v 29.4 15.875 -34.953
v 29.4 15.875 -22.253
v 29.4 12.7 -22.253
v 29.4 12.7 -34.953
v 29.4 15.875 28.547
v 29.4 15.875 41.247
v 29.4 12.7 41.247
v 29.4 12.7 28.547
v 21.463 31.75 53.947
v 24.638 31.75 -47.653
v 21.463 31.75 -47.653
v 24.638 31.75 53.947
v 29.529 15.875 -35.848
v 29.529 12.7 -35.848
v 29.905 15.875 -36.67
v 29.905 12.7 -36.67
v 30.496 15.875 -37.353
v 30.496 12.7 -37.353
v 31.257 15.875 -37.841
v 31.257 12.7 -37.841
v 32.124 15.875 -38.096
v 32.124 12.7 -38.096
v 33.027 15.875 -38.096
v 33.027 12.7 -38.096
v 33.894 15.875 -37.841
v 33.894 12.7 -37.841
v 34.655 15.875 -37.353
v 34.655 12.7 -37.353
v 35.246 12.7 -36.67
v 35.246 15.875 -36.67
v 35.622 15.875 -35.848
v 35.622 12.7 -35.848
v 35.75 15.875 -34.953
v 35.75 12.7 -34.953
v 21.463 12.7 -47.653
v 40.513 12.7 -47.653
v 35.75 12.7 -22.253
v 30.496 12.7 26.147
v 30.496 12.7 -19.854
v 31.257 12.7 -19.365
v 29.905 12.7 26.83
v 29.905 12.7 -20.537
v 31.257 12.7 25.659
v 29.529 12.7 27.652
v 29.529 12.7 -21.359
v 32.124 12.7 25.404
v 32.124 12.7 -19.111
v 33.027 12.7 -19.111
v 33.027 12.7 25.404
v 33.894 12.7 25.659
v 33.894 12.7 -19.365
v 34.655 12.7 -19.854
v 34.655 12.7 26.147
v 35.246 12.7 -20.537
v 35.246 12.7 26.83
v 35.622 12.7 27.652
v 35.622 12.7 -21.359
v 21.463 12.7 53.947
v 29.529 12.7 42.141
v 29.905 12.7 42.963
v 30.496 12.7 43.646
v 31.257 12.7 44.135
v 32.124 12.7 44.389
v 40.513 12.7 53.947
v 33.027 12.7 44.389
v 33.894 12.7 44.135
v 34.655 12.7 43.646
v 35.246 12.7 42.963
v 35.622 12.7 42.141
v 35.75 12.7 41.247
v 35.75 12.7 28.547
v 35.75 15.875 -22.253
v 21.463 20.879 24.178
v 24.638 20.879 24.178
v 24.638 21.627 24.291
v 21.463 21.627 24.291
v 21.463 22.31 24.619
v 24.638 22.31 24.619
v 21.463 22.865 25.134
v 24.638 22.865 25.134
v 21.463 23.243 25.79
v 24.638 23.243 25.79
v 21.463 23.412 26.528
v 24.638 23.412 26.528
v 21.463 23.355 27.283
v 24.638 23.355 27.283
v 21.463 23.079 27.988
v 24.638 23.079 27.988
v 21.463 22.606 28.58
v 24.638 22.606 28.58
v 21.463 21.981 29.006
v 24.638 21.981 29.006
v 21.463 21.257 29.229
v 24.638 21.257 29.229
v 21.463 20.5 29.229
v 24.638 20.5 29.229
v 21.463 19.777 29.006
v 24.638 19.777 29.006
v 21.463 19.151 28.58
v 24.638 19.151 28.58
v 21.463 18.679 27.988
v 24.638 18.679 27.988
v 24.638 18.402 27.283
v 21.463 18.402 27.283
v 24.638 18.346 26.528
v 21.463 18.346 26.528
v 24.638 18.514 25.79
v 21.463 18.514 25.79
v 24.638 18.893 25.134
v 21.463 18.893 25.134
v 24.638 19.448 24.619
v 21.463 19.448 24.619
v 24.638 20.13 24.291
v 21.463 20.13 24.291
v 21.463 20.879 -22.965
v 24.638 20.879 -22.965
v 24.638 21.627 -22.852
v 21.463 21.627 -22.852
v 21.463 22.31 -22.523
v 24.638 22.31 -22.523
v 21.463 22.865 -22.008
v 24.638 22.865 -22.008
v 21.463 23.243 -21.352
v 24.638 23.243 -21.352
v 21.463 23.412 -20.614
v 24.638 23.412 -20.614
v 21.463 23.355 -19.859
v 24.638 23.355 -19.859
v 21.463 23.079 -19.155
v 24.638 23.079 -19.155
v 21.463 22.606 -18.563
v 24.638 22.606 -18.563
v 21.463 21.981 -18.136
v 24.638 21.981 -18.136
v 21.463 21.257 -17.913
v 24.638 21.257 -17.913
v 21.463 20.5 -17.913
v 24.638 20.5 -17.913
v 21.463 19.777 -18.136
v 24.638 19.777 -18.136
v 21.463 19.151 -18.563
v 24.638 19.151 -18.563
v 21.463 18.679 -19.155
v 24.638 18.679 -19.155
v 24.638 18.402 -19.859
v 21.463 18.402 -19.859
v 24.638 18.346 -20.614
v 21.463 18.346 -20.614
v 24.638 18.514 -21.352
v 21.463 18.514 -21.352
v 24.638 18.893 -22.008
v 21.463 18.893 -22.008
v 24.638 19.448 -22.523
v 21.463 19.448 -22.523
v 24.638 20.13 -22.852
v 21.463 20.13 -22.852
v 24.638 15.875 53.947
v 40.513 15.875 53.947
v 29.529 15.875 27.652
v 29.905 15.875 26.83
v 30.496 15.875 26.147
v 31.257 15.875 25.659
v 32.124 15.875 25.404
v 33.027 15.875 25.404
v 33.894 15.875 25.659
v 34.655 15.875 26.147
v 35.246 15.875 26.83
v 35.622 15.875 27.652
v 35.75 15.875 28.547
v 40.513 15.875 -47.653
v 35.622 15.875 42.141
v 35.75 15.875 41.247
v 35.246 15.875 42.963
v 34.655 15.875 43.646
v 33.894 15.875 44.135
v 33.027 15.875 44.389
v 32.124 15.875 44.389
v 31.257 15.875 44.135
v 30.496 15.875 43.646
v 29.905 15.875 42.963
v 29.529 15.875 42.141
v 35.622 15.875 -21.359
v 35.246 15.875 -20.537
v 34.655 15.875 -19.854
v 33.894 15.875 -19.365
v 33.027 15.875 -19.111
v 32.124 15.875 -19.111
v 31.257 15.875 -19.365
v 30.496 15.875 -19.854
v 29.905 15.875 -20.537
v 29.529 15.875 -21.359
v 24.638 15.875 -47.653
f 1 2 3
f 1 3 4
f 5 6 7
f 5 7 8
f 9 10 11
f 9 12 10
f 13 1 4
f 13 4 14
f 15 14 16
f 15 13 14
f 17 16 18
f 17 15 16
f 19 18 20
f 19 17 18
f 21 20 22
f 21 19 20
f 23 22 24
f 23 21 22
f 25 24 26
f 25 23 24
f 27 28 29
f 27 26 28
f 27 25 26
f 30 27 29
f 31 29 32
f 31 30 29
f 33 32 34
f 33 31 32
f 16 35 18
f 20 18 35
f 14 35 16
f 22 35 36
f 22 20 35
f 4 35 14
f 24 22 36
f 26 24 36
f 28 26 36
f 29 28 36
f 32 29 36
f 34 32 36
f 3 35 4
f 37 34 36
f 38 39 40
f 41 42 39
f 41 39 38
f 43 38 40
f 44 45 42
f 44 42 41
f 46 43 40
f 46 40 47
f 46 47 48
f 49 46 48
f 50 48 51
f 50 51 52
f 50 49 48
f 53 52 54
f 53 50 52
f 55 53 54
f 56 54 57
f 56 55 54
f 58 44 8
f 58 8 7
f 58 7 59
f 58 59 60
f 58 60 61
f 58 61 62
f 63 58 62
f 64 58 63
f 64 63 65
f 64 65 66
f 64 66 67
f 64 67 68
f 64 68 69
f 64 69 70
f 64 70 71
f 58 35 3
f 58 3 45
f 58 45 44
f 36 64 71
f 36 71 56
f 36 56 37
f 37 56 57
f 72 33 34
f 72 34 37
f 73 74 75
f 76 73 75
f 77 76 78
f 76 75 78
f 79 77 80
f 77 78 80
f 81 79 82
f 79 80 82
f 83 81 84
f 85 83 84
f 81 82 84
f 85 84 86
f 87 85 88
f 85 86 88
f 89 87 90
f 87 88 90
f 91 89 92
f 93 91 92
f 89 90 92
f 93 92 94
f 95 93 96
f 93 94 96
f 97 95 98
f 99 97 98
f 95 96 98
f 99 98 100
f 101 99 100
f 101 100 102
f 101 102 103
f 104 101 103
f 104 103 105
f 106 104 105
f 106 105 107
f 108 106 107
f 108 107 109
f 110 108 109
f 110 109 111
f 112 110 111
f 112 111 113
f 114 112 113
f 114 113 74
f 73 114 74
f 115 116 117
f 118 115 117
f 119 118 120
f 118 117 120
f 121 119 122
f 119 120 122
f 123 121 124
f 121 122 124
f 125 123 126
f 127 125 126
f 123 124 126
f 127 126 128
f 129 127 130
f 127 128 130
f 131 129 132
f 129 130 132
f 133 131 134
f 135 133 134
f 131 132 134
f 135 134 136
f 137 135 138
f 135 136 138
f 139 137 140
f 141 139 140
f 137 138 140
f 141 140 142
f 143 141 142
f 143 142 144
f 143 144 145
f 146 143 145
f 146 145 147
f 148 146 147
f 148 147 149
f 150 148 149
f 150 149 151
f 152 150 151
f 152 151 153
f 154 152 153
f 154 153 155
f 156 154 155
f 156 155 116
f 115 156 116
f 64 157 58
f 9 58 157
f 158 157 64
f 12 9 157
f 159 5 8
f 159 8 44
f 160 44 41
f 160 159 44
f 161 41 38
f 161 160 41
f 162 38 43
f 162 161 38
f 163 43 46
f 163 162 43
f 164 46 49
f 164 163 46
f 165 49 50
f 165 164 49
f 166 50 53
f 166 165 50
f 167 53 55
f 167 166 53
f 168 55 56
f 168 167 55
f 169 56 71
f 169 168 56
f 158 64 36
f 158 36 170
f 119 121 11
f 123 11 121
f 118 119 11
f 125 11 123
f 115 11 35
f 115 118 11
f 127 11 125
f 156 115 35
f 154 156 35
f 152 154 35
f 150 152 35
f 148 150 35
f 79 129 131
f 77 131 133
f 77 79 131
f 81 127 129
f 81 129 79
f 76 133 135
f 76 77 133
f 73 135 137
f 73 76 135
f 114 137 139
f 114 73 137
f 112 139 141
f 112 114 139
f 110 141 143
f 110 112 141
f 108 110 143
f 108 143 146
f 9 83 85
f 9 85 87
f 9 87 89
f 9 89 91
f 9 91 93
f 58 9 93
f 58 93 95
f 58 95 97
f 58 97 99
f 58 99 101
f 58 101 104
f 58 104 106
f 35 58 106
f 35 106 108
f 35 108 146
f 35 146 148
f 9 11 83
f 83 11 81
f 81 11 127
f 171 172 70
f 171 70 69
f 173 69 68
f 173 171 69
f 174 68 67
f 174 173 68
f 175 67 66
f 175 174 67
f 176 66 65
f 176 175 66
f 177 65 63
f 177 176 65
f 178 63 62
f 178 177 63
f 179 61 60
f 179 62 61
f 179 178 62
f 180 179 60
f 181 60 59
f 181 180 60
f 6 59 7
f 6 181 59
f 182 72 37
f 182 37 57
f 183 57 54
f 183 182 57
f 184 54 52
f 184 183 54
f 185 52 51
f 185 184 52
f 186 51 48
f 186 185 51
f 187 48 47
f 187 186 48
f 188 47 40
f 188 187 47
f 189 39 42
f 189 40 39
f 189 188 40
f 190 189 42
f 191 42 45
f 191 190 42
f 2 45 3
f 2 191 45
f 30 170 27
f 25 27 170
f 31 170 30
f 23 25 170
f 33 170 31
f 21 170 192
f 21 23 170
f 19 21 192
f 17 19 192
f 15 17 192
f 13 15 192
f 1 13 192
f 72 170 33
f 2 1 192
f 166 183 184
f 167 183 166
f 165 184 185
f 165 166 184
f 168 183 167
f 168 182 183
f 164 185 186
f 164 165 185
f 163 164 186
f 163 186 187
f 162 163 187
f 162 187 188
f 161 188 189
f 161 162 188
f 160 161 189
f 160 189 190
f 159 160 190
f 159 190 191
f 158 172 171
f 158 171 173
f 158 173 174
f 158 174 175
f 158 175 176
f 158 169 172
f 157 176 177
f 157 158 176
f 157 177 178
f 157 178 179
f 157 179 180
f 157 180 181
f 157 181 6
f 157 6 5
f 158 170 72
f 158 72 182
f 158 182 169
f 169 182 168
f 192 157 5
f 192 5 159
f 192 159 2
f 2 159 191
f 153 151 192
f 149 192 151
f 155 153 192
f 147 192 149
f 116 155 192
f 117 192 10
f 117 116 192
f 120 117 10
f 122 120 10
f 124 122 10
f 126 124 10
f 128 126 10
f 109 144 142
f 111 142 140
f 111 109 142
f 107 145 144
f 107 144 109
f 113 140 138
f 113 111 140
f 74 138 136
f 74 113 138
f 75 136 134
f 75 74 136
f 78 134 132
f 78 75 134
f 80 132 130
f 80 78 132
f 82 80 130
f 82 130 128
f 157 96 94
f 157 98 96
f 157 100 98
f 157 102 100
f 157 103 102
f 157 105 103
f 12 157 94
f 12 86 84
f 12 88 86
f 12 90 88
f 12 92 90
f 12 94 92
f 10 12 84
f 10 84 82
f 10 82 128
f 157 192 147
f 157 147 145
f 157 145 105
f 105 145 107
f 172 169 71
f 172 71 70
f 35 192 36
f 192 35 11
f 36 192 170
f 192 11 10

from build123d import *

# Parameters (mm, degrees)
EXTRUDE1_DEPTH     = 50.8
CUT_EXTRUDE1_DEPTH = 70.3077329
SKETCH4_R          = 2.54
CUT_EXTRUDE2_DEPTH = 65.578023899


with BuildPart() as part:
    # Sketch1 → Extrude1 (new, symmetric)
    with BuildSketch(Plane.XY.offset(3.146668532)):
        Polygon((21.463, 31.75), (21.463, 12.7), (40.513, 12.7), (40.513, 15.875), (24.638, 15.875), (24.638, 31.75), align=None)
    extrude(amount=EXTRUDE1_DEPTH, both=True)

    # Sketch3 → Cut-Extrude1 (cut, through all)
    with BuildSketch(Plane(origin=(0, 15.875, 0), x_dir=(-1, 0, 0), z_dir=(0, 1, 0))):
        with BuildLine():
            Line((-35.7505, -34.953331468), (-35.7505, -22.253331468))
            ThreePointArc((-35.7505, -22.253331468), (-32.5755, -19.078331468), (-29.4005, -22.253331468))
            Line((-29.4005, -22.253331468), (-29.4005, -34.953331468))
            ThreePointArc((-29.4005, -34.953331468), (-32.5755, -38.128331468), (-35.7505, -34.953331468))
        make_face()
        with BuildLine():
            Line((-29.4005, 41.246668532), (-29.4005, 28.546668532))
            ThreePointArc((-29.4005, 28.546668532), (-32.5755, 25.371668532), (-35.7505, 28.546668532))
            Line((-35.7505, 28.546668532), (-35.7505, 41.246668532))
            ThreePointArc((-35.7505, 41.246668532), (-32.5755, 44.421668532), (-29.4005, 41.246668532))
        make_face()
    extrude(amount=-CUT_EXTRUDE1_DEPTH, mode=Mode.SUBTRACT)

    # Sketch4 → Cut-Extrude2 (cut, through all)
    with BuildSketch(Plane(origin=(24.638, 0, 0), x_dir=(0, 0, -1), z_dir=(1, 0, 0))):
        with Locations((20.424531468, 20.8788)):
            Circle(SKETCH4_R)
        with Locations((-26.717868532, 20.8788)):
            Circle(SKETCH4_R)
    extrude(amount=-CUT_EXTRUDE2_DEPTH, mode=Mode.SUBTRACT)


solid = part.part
